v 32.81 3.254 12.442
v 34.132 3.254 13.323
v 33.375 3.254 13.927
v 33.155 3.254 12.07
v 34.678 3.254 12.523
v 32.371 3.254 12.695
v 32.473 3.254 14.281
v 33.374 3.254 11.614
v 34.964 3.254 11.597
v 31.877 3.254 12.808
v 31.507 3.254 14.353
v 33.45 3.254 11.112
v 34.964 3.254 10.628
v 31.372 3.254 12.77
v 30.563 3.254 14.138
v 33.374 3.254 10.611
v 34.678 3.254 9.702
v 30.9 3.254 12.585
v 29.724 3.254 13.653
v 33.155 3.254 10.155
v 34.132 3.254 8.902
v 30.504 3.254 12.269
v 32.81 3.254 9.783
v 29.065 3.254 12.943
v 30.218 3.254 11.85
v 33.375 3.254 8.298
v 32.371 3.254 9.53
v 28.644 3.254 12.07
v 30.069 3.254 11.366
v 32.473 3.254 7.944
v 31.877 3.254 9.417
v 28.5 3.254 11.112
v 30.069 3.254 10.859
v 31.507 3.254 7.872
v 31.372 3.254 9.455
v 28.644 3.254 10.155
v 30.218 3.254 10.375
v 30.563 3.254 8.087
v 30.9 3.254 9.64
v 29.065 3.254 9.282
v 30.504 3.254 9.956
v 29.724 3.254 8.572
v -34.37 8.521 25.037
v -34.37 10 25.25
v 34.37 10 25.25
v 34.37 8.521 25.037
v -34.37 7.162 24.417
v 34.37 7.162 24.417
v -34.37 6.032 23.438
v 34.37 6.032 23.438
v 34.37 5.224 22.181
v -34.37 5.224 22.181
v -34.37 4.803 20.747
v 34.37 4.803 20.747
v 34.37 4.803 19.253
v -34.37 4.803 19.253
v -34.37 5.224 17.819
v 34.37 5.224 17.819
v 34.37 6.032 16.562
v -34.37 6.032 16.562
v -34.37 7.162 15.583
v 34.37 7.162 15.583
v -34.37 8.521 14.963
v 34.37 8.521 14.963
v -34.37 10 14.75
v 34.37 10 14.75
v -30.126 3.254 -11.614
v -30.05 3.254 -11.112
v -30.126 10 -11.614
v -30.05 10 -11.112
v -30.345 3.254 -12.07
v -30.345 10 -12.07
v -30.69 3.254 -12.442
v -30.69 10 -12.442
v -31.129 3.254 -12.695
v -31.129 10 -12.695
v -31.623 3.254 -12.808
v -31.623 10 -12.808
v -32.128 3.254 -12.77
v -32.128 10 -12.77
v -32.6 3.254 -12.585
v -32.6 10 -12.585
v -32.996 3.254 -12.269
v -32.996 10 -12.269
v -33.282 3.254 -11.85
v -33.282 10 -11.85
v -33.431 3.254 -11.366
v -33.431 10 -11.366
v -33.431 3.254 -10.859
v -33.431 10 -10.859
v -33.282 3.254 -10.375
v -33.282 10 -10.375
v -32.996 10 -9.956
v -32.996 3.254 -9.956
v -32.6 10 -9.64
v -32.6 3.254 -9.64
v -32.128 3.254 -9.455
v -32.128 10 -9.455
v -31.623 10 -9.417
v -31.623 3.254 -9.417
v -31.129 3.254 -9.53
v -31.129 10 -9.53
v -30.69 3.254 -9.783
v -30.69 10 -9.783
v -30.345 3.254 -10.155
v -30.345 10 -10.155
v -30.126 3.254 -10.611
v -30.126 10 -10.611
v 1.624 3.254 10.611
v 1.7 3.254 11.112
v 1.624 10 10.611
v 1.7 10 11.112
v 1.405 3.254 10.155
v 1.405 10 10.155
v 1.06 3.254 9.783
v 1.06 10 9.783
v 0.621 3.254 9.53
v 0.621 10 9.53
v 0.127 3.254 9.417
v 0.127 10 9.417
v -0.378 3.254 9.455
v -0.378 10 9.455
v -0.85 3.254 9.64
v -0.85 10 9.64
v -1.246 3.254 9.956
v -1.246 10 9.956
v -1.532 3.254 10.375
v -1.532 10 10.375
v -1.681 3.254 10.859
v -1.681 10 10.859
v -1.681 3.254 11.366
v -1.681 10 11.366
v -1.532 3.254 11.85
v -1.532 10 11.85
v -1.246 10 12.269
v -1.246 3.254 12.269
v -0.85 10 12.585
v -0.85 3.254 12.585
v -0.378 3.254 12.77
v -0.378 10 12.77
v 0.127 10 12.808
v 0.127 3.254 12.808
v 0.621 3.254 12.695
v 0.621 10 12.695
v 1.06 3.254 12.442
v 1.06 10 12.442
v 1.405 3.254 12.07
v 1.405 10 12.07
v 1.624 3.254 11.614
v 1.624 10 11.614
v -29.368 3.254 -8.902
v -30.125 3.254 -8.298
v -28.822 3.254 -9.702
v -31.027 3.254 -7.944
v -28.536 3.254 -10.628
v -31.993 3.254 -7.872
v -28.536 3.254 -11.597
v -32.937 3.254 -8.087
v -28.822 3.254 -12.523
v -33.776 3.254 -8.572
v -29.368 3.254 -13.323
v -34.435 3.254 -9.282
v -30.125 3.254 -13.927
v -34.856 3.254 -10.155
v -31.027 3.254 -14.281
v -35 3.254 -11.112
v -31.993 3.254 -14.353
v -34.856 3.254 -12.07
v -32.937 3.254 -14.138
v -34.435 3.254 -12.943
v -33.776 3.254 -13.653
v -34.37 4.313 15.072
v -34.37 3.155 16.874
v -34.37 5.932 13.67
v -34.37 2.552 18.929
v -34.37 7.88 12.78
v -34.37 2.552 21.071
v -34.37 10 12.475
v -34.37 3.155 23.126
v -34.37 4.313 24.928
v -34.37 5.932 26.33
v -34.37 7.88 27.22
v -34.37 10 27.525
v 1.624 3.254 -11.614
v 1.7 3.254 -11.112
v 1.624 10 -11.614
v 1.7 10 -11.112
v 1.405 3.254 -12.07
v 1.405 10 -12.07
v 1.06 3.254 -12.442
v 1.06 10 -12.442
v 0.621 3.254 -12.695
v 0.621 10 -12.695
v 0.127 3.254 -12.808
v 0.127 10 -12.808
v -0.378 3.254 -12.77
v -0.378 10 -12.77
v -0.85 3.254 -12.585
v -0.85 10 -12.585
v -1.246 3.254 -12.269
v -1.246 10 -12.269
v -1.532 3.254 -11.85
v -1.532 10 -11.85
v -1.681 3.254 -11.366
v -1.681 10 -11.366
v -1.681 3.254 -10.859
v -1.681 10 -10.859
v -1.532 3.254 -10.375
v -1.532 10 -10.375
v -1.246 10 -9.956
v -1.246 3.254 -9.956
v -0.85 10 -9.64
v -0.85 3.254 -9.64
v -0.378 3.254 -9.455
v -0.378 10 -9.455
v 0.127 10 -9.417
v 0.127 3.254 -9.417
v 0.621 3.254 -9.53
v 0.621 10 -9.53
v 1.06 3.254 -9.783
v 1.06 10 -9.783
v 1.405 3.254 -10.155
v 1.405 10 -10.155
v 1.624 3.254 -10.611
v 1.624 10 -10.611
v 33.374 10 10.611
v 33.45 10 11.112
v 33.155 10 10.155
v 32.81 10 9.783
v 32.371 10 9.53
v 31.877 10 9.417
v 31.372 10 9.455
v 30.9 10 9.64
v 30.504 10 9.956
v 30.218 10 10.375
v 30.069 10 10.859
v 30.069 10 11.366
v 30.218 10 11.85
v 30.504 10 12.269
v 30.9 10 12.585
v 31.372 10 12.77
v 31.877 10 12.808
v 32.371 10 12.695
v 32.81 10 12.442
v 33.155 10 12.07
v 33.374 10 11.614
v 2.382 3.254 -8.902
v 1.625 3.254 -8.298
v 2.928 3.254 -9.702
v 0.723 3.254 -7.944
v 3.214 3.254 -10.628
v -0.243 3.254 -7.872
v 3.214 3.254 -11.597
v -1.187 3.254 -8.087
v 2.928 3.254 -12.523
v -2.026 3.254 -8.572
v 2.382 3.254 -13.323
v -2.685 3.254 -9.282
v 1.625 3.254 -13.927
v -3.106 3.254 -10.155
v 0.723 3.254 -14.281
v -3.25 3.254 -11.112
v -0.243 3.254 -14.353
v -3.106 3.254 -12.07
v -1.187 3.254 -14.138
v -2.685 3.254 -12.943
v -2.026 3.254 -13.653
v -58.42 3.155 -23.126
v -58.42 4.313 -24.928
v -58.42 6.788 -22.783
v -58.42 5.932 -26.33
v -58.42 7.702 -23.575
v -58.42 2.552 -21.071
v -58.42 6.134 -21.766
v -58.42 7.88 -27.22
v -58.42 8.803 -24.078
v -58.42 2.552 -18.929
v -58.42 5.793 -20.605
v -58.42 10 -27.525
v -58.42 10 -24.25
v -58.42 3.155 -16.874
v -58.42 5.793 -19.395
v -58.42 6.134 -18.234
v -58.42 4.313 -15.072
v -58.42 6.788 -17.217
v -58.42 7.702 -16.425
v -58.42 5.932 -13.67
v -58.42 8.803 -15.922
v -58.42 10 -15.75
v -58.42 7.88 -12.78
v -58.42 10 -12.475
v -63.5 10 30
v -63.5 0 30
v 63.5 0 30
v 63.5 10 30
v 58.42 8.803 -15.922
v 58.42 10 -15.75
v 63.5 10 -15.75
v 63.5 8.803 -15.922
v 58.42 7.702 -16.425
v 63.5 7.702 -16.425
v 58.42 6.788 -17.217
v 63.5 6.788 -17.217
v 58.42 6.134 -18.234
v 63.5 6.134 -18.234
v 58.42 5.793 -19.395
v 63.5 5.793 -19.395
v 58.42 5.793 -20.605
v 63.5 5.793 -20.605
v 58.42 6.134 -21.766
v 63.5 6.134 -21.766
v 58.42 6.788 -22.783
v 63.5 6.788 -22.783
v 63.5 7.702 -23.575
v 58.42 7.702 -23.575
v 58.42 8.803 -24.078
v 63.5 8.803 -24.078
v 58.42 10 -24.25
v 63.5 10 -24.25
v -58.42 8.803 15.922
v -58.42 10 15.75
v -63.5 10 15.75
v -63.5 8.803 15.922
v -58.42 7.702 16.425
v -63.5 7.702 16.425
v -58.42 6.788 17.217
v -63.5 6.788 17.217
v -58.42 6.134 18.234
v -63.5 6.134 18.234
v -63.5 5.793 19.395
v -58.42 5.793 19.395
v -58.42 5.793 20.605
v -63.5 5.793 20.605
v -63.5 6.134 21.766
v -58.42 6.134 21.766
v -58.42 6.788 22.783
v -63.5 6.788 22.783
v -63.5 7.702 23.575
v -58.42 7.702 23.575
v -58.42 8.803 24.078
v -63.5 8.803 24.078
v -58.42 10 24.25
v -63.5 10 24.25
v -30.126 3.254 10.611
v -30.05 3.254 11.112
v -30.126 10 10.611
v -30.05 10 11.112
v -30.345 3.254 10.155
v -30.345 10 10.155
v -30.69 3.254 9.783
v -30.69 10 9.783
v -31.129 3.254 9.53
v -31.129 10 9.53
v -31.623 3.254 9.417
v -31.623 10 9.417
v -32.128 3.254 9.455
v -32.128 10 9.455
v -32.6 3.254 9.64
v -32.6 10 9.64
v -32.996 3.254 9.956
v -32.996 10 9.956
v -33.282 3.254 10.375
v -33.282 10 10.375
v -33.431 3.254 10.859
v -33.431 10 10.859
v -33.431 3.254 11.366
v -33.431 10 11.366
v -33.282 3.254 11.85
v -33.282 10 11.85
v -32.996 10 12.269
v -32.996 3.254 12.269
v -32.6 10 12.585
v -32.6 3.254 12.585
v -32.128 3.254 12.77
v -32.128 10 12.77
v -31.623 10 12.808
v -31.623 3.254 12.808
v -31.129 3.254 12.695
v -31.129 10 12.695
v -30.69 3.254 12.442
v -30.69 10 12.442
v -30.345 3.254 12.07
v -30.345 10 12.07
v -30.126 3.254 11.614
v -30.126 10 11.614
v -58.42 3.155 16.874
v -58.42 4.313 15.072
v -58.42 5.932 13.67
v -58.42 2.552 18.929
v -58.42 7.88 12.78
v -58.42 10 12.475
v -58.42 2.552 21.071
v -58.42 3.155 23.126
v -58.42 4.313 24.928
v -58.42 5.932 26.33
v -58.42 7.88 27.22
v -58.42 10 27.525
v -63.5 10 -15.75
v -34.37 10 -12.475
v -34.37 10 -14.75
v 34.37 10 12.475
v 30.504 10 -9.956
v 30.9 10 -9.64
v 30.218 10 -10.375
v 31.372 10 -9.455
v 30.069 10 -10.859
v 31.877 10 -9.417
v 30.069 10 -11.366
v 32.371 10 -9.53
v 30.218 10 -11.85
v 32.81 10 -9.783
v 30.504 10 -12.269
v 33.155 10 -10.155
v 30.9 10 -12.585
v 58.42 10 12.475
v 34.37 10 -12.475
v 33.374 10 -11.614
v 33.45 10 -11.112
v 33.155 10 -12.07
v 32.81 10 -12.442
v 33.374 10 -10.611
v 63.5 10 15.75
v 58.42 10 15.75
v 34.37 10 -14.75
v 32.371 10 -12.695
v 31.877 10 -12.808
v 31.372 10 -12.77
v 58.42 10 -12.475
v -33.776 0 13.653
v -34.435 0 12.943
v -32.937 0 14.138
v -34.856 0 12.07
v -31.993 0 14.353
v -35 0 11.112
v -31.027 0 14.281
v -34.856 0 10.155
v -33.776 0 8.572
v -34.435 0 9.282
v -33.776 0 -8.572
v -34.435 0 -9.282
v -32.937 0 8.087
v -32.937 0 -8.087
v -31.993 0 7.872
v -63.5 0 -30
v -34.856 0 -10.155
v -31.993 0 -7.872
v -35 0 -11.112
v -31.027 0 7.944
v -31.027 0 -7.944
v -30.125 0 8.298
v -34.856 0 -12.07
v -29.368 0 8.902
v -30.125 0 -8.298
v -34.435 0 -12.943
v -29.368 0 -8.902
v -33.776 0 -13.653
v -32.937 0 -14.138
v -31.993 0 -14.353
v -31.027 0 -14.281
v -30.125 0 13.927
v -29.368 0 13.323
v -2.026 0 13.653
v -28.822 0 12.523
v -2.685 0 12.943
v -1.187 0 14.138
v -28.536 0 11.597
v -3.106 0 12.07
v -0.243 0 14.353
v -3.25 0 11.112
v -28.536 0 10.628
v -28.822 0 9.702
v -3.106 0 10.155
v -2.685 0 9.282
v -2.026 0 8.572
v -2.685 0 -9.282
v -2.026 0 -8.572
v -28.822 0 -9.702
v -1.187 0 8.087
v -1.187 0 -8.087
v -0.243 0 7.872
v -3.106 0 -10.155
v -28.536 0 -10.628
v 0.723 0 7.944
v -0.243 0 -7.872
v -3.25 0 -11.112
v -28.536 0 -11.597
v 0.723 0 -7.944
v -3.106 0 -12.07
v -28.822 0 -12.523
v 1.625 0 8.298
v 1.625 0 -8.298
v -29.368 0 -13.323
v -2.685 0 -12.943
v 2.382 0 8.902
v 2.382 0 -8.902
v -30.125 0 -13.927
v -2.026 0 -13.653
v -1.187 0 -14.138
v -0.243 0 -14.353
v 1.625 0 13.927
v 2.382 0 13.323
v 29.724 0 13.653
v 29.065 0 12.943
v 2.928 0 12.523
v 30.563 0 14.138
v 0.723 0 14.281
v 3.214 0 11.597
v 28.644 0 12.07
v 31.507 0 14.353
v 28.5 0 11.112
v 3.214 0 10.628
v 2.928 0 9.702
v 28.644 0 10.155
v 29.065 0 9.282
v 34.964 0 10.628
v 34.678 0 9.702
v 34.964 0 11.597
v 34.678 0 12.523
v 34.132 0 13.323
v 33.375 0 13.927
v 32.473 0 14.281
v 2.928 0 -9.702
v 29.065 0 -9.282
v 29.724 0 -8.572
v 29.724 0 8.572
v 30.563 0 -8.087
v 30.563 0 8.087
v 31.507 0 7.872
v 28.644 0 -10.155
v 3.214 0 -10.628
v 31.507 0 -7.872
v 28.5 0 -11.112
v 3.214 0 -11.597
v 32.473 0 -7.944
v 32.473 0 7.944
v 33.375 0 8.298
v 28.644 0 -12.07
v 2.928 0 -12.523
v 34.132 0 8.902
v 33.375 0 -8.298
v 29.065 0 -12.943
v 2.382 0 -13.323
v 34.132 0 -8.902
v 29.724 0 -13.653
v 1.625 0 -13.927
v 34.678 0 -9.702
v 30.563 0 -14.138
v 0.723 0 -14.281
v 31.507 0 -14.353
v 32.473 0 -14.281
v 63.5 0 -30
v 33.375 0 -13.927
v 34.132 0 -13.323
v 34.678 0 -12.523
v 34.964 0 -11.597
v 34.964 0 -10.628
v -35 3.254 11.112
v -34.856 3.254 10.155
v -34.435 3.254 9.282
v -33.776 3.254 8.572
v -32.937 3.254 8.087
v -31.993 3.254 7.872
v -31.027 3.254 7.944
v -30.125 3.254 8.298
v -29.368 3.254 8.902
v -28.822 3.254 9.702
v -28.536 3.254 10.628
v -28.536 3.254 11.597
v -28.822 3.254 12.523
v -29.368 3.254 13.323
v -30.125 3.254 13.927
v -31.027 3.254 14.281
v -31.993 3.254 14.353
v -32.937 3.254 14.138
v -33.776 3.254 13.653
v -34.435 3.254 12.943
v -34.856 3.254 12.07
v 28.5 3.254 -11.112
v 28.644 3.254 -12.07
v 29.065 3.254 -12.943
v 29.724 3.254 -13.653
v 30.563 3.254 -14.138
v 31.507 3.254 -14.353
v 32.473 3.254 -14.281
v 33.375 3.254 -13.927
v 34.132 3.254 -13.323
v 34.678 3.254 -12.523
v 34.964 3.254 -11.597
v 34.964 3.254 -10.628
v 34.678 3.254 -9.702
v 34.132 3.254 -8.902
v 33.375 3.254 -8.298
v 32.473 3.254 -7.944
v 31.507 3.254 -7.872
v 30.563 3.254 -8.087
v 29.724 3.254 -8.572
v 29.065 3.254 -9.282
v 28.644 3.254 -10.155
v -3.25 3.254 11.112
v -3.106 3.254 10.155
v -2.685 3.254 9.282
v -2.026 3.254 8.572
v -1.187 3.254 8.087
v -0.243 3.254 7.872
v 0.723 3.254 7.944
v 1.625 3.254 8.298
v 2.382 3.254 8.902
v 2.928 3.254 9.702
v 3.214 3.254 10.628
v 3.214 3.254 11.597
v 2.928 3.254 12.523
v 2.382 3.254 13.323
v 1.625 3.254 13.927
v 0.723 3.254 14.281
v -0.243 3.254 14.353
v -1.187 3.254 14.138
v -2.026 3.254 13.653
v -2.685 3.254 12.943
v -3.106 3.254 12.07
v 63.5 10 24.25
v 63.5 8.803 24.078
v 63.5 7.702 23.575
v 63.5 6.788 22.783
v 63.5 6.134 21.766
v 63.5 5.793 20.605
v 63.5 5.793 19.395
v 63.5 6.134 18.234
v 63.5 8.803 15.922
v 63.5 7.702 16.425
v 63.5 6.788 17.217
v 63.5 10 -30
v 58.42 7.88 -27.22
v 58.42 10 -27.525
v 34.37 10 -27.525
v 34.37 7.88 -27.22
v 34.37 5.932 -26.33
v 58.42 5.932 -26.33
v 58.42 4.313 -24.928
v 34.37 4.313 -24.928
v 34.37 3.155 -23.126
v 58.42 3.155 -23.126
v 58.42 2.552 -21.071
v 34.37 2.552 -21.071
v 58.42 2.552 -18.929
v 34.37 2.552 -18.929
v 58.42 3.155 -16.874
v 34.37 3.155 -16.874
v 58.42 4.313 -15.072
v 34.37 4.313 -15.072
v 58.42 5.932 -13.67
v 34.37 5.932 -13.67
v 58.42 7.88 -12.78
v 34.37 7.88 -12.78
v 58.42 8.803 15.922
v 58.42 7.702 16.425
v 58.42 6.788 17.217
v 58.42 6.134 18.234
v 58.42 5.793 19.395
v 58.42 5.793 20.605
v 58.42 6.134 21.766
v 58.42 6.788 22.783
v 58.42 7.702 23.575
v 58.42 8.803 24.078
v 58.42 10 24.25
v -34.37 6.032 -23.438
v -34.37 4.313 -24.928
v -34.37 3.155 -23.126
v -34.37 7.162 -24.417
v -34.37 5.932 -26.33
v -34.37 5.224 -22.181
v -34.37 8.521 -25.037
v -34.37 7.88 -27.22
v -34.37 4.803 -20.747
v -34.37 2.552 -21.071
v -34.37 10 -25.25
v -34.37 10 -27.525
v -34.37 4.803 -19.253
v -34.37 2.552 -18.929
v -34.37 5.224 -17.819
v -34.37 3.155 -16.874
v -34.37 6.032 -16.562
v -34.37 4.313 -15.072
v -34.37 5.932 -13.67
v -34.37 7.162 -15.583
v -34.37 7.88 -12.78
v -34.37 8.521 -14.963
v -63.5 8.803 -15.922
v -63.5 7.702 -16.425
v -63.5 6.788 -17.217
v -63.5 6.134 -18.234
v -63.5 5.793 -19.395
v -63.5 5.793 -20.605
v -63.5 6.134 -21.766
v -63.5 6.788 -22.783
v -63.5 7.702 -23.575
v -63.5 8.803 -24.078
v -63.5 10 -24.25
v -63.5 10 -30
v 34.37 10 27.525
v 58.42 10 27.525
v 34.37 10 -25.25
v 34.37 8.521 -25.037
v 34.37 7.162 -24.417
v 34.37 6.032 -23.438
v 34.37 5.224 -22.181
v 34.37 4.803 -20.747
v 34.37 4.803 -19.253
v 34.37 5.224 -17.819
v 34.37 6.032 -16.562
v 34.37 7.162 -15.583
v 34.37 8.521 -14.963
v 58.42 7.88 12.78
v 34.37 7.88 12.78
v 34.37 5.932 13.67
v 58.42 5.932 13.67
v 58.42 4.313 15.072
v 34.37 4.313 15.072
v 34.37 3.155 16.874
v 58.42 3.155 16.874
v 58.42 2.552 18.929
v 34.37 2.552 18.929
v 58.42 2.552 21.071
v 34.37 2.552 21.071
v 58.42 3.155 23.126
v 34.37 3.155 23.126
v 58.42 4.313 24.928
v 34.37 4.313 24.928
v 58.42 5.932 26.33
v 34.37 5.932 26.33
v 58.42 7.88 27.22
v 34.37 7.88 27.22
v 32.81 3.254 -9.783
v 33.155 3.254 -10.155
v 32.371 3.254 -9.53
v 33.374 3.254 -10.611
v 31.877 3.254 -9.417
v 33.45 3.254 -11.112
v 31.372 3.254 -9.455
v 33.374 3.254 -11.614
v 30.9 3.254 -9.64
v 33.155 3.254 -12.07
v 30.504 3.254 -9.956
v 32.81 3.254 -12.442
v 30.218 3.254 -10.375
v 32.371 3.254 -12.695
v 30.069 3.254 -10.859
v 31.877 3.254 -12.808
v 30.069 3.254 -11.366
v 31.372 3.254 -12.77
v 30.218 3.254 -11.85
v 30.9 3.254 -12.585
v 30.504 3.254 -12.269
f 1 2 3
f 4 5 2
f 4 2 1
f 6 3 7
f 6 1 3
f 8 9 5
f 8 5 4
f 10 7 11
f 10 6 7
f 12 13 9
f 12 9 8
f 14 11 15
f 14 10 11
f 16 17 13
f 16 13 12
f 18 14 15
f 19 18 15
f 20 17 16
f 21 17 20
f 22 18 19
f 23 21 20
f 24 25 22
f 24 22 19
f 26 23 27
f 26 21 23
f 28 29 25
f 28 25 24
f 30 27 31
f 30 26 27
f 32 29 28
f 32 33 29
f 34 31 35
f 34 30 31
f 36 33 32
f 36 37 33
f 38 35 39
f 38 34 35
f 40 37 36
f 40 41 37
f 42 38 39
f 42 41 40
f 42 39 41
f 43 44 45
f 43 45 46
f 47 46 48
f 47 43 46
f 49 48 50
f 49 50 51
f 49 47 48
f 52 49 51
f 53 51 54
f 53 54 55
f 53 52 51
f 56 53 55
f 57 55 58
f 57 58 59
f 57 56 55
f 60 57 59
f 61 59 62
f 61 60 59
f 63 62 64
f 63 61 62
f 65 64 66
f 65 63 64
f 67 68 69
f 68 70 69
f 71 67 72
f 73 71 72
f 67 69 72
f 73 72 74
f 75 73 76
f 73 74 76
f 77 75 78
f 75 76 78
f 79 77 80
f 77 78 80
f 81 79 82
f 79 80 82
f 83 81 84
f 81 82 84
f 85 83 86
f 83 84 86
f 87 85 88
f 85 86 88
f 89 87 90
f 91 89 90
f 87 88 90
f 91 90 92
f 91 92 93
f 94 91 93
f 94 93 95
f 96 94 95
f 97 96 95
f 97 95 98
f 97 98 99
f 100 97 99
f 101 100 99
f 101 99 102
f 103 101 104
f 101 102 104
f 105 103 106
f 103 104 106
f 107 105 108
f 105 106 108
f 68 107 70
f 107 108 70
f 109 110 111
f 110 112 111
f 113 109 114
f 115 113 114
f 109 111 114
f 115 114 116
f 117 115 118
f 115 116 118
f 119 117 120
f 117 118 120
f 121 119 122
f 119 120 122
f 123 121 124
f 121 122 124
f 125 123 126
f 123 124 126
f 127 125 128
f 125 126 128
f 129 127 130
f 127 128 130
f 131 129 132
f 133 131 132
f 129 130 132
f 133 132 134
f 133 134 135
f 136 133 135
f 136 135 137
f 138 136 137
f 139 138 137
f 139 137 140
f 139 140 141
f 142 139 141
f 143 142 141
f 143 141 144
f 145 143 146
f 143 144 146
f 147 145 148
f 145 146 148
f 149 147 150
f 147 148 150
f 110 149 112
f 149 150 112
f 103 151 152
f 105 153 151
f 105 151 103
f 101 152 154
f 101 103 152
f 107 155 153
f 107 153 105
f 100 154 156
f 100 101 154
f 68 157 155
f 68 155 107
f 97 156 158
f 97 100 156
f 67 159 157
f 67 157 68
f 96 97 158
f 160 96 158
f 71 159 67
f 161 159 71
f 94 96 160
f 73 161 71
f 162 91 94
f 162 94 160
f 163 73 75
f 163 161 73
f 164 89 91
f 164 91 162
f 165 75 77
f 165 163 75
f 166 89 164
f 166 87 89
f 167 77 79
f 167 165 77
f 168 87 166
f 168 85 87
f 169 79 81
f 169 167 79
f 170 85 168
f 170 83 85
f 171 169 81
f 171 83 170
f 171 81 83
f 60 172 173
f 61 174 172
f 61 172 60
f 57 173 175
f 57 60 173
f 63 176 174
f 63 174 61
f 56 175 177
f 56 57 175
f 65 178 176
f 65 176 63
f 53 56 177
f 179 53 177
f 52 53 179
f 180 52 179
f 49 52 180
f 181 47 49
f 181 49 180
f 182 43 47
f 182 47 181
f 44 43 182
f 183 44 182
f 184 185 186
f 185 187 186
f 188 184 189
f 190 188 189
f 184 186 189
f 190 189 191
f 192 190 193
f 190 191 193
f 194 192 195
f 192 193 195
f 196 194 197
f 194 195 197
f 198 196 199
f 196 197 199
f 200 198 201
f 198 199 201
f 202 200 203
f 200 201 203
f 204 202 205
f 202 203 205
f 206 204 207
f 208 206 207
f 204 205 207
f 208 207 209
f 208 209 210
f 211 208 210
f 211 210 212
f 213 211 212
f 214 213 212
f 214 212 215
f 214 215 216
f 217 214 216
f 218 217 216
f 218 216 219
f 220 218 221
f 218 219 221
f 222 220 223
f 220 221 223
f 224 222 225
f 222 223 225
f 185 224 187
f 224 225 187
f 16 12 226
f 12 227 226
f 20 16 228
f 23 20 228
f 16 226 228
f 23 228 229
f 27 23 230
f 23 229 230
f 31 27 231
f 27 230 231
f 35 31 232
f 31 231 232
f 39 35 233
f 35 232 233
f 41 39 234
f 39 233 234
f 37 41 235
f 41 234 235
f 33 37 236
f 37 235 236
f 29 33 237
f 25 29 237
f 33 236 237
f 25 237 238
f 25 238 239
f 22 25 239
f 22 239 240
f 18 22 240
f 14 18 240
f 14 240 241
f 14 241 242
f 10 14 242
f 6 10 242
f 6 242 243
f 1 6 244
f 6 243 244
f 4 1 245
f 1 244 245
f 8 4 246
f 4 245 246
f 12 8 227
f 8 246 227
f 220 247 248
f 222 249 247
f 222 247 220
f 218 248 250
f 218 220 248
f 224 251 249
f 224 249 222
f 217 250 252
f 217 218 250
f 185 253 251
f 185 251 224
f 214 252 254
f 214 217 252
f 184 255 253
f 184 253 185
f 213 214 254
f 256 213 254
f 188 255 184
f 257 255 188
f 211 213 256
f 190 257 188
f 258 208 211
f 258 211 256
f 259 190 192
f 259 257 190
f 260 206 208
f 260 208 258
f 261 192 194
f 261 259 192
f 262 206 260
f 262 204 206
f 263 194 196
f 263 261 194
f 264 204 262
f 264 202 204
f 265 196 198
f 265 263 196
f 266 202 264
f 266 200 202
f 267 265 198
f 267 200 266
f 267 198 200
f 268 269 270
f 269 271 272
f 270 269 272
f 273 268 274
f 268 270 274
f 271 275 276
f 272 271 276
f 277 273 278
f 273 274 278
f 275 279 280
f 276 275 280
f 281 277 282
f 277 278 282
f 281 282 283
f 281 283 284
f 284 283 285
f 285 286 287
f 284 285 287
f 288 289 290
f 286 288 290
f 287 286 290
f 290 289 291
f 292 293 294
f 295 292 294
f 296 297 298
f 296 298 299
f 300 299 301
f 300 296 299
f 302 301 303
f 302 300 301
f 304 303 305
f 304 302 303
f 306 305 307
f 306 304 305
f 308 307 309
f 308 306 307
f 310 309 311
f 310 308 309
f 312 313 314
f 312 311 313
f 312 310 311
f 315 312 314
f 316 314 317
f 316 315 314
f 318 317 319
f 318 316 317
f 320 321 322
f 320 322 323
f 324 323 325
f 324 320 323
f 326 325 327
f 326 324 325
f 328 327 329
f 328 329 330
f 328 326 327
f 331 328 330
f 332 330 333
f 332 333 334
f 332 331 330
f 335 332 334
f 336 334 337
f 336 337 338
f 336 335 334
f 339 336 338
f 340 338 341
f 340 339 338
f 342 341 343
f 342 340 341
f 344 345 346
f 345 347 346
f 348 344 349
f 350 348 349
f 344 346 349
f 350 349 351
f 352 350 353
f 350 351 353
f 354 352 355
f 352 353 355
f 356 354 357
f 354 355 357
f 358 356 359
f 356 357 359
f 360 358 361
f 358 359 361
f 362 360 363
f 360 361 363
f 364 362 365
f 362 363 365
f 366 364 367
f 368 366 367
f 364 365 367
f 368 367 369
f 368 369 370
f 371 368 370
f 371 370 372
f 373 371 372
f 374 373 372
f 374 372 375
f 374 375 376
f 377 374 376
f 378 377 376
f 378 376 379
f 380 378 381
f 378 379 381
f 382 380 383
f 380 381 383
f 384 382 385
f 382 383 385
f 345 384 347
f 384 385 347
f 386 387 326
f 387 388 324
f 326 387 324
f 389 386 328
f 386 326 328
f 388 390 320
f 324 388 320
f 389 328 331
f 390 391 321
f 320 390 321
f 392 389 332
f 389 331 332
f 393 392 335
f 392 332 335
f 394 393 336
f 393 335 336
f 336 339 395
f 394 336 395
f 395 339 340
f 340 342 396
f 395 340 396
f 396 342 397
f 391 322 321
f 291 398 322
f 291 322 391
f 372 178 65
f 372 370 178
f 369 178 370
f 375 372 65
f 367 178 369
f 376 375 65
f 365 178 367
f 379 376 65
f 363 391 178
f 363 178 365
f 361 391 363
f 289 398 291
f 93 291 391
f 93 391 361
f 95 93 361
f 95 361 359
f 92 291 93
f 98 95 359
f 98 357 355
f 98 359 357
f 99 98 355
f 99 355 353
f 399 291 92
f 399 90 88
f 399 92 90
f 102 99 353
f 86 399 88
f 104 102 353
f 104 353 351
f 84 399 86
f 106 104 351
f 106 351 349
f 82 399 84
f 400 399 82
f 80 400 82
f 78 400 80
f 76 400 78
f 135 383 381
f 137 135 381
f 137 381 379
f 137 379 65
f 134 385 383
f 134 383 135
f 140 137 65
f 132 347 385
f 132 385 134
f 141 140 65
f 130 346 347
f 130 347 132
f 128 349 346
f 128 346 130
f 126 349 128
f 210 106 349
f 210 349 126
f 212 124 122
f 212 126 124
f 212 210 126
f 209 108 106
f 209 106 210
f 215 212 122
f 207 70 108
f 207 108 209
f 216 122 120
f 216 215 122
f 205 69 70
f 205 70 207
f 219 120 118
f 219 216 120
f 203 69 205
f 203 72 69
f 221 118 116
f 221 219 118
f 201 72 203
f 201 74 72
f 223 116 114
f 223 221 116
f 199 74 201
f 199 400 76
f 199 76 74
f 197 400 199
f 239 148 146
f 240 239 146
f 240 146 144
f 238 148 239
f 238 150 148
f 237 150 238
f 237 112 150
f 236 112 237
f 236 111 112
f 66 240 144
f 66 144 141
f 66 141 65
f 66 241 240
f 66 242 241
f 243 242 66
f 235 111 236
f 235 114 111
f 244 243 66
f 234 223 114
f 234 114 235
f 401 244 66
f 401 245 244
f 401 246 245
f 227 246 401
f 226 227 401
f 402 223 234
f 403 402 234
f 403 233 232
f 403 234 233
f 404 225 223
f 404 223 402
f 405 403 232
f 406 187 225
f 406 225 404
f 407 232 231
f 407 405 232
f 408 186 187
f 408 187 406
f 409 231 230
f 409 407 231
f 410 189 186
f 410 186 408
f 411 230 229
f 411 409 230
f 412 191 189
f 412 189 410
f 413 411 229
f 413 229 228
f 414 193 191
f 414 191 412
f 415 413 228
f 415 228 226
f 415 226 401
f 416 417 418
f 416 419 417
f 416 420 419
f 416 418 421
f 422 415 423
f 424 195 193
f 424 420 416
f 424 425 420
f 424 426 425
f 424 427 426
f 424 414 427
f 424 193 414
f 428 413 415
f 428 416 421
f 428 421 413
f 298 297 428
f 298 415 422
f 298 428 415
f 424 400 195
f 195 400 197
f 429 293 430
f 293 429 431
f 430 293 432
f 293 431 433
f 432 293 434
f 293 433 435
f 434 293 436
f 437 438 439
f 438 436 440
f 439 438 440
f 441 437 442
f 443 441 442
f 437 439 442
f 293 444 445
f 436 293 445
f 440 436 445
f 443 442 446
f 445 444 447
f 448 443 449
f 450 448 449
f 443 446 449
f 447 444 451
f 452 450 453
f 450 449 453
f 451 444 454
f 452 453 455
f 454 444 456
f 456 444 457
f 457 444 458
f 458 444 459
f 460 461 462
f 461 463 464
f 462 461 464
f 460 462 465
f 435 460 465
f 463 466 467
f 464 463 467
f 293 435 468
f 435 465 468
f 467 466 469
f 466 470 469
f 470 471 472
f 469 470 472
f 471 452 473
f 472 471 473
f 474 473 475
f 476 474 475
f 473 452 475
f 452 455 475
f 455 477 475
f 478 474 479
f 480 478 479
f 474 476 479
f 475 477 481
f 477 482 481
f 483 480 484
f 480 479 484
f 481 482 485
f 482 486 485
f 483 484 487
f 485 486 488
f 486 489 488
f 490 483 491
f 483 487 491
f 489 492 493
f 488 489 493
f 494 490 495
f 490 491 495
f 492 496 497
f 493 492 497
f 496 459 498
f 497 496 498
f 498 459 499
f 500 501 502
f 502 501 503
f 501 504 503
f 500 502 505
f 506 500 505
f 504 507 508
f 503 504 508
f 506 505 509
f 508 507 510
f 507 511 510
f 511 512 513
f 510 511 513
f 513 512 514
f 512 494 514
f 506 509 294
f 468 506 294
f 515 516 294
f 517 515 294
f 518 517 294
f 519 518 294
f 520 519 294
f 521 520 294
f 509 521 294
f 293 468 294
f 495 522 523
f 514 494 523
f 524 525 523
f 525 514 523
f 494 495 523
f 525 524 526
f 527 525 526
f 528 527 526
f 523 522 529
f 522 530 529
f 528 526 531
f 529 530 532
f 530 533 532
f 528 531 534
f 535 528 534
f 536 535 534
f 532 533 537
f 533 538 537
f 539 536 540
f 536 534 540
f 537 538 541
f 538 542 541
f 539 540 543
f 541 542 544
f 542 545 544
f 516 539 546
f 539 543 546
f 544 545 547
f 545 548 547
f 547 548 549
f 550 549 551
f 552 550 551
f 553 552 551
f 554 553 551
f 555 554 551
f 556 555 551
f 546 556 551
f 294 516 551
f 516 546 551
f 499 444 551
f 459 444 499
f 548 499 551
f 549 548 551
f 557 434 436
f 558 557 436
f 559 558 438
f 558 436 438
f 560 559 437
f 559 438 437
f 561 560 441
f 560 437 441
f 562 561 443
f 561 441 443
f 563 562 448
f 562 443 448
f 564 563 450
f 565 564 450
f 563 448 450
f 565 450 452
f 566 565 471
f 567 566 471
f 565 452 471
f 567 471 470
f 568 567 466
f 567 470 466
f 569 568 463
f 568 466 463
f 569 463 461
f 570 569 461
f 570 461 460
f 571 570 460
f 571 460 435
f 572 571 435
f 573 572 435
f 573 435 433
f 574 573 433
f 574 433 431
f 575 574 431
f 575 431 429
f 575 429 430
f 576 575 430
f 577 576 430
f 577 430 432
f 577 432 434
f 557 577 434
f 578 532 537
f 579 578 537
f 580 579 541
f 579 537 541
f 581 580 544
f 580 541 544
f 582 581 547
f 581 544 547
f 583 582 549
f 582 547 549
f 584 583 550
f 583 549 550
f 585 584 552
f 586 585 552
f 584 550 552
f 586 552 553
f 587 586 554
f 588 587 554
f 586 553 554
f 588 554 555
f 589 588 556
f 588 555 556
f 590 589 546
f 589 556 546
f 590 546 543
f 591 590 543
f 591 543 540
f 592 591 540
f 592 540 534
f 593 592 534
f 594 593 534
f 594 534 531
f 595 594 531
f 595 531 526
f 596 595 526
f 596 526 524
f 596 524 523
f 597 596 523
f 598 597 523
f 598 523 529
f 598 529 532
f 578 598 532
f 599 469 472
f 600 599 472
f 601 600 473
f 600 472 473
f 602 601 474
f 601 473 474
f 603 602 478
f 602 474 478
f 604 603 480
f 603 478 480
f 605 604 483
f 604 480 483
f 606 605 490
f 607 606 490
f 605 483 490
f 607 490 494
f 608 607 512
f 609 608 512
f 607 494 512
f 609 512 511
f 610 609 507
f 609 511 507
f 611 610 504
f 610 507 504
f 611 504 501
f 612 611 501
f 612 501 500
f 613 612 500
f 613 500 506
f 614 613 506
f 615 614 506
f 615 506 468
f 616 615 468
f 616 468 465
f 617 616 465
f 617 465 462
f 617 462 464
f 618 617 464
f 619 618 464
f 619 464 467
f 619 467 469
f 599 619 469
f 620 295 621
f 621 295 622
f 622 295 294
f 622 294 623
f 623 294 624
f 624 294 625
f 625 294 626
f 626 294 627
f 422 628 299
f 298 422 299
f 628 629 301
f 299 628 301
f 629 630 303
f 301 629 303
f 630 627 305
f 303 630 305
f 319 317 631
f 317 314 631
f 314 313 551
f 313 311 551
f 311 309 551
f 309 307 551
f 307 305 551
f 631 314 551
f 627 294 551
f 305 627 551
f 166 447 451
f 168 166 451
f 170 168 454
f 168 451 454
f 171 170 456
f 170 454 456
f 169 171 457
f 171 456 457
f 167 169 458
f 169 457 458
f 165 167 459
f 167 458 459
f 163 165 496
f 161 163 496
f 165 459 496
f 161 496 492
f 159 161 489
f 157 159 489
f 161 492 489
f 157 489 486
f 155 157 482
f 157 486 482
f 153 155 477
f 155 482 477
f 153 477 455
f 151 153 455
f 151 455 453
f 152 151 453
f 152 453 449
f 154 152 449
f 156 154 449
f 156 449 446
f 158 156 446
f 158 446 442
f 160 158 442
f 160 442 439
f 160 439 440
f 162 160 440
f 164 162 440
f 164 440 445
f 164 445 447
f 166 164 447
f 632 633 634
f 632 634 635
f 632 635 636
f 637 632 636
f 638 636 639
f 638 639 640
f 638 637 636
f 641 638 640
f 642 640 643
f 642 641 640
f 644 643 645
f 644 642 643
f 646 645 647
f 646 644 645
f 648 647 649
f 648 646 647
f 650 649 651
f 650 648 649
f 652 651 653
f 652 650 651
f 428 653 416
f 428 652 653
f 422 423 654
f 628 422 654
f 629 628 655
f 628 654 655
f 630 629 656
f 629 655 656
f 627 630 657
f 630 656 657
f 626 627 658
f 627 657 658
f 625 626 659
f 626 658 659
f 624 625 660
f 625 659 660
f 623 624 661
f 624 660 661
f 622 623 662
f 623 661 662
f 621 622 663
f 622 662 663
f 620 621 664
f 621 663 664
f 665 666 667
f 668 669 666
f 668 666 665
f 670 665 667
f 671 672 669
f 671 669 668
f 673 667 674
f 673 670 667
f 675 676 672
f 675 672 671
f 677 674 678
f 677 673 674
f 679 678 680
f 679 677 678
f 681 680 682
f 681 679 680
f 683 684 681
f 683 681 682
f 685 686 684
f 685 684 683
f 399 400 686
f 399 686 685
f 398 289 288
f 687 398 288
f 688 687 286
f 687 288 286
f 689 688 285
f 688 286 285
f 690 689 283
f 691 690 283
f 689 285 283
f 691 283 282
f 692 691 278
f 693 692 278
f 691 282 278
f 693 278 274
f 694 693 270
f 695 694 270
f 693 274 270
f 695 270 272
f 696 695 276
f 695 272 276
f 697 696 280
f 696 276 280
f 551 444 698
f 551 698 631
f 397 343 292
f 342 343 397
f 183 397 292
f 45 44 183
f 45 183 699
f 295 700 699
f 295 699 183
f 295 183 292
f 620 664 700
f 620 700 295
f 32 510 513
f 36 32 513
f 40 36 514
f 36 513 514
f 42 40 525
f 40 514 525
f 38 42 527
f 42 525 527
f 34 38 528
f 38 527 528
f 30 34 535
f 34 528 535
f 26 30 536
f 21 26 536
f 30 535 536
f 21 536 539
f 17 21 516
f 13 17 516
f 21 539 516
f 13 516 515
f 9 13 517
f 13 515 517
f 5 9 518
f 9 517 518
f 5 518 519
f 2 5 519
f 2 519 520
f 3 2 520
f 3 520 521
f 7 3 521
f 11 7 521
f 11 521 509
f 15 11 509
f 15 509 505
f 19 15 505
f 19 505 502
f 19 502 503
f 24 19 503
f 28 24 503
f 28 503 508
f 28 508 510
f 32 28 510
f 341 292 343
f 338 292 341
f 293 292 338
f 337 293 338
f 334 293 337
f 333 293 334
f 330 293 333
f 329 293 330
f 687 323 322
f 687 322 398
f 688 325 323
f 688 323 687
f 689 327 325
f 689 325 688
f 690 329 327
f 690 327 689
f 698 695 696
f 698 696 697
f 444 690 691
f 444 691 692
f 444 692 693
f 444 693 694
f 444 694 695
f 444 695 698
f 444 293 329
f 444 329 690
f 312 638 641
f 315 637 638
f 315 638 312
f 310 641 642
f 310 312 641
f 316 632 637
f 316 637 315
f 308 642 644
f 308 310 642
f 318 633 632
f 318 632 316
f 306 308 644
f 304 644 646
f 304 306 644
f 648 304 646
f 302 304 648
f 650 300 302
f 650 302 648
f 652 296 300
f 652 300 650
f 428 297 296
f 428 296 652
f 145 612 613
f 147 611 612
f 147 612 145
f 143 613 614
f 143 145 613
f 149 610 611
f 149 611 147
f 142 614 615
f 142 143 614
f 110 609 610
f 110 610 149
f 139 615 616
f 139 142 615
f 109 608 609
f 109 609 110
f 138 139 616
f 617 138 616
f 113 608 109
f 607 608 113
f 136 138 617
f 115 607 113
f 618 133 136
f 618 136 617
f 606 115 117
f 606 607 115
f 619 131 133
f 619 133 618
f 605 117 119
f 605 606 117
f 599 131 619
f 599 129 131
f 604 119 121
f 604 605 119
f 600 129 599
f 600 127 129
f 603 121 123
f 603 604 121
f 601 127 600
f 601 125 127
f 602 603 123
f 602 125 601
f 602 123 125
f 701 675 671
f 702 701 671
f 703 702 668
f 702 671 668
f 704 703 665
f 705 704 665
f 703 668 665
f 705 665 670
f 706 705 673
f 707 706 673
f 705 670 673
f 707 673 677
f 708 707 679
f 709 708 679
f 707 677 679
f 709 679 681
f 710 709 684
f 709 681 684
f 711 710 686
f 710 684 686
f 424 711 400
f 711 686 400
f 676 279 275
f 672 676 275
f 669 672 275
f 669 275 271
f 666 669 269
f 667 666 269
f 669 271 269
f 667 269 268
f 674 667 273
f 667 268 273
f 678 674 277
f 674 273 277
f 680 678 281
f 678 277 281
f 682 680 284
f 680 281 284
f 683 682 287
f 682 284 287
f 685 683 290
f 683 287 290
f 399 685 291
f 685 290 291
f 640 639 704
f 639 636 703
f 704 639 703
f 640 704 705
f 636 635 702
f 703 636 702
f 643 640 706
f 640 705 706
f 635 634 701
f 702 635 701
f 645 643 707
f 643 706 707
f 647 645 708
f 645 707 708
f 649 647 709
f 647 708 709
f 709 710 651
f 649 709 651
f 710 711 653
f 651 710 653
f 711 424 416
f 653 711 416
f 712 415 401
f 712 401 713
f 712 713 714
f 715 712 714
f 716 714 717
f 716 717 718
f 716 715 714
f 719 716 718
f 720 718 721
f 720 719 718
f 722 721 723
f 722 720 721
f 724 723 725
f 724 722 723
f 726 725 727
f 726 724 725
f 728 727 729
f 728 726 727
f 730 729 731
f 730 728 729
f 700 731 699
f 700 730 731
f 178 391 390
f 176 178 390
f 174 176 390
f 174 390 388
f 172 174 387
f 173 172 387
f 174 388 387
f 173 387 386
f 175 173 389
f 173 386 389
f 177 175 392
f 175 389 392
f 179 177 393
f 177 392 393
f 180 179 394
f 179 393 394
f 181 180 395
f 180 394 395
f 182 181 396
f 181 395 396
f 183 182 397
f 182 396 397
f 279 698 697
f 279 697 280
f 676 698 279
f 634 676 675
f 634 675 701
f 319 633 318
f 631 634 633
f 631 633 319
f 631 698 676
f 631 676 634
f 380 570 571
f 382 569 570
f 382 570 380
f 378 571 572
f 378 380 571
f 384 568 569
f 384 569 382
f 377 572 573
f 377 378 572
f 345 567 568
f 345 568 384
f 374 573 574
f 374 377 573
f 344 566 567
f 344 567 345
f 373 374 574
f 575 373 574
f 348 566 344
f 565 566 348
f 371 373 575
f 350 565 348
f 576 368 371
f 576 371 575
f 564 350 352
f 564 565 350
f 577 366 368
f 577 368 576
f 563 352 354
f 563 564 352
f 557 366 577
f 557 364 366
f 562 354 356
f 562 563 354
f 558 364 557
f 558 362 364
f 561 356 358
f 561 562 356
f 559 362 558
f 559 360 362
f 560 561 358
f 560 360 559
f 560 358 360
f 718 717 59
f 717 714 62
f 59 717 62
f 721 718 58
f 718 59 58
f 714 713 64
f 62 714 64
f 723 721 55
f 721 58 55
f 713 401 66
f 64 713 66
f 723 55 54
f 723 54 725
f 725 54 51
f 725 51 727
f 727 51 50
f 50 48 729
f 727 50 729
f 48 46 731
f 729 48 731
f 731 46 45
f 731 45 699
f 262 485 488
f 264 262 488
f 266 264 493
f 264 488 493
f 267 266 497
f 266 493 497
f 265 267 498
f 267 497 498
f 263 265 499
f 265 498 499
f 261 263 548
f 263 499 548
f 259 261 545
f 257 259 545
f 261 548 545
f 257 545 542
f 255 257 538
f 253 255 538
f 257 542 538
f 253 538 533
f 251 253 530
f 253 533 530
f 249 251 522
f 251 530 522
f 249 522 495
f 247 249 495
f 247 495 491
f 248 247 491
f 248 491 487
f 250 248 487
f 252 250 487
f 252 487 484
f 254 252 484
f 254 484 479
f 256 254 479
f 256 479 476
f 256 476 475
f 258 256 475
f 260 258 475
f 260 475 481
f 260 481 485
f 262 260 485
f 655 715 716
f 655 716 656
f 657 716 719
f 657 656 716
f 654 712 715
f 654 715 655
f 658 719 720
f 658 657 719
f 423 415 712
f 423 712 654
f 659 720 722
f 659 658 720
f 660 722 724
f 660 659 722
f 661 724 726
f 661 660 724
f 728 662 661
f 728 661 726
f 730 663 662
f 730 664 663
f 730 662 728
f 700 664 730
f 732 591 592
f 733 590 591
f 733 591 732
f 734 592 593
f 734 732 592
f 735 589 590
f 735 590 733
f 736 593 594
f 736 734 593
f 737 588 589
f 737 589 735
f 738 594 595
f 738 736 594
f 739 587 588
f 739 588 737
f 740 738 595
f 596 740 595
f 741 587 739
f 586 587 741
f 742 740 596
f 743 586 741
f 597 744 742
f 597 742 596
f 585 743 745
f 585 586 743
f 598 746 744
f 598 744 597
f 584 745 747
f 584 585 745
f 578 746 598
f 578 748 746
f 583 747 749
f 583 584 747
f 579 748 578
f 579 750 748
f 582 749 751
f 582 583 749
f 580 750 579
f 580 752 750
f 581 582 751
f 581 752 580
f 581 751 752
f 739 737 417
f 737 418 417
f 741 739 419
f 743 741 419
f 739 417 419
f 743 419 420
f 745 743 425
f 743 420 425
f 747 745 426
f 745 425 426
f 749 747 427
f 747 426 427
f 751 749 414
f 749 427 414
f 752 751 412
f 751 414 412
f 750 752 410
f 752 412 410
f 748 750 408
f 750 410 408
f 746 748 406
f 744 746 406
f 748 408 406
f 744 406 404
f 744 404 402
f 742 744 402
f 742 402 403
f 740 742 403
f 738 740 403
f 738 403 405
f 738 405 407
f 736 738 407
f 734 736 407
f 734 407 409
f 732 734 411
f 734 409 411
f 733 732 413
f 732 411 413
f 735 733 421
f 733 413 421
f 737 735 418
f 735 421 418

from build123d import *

# Parameters (mm, degrees)
SKETCH1_W                      = 127
SKETCH1_H                      = 60
BOSS_EXTRUDE1_DEPTH            = 10
CUT_EXTRUDE1_START             = -5.08
SKETCH3_R                      = 7.525
CUT_EXTRUDE1_DEPTH             = 24.05
CUT_EXTRUDE2_REACH             = 127.954
SKETCH4_R                      = 4.25
CUT_EXTRUDE2_DIRECTION_2_REACH = 127.954
CUT_EXTRUDE3_START             = -68.74
SKETCH5_R                      = 5.25
SKETCH5_R_2                    = 4.25
CUT_EXTRUDE3_DEPTH             = 68.74
CBORE_FOR_M3_SHCS1_D           = 3.4
CBORE_FOR_M3_SHCS1_CBORE_D     = 6.5
CBORE_FOR_M3_SHCS1_CBORE_DEPTH = 3.254


with BuildPart() as part:
    # Sketch1 → Boss-Extrude1 (new body)
    with BuildSketch(Plane(origin=(0, 0, 0), x_dir=(1, 0, 0), z_dir=(0, 1, 0))):
        Rectangle(SKETCH1_W, SKETCH1_H)
    extrude(amount=BOSS_EXTRUDE1_DEPTH)

    # Sketch3 → Cut-Extrude1 (cut)
    with BuildSketch(Plane.ZY.offset(63.5).offset(CUT_EXTRUDE1_START)):
        with Locations((-20, 10)):
            Circle(SKETCH3_R)
        with Locations((20, 10)):
            Circle(SKETCH3_R)
    cut_extrude1 = extrude(amount=-CUT_EXTRUDE1_DEPTH, mode=Mode.SUBTRACT)

    # Mirror1: Cut-Extrude1 across plane
    add(cut_extrude1.mirror(Plane(origin=(0, 0, 0), x_dir=(0, 0, 1), z_dir=(1, 0, 0))), mode=Mode.SUBTRACT)

    # Sketch4 → Cut-Extrude2 (cut, up to next)
    with BuildSketch(Plane(origin=(-58.42, 0, 0), x_dir=(0, 0, -1), z_dir=(1, 0, 0)), mode=Mode.PRIVATE) as cut_extrude2_sk1:
        with Locations((20, 10)):
            Circle(SKETCH4_R)
    cut_extrude2_tool1 = extrude(cut_extrude2_sk1.sketch, amount=-CUT_EXTRUDE2_REACH, mode=Mode.PRIVATE) & part.part
    cut_extrude2 = cut_extrude2_tool1.solids().sort_by_distance((-58.42, 10, -20))[0]
    add(cut_extrude2, mode=Mode.SUBTRACT)

    # Cut-Extrude2 direction 2: up to this face of the body (flat: up to its plane)
    cut_extrude2_direction_2_end = Plane(part.part.faces().sort_by_distance((63.5, 5, 0))[0])
    # Sketch4 → Cut-Extrude2 direction 2 (cut, up to the picked face)
    with BuildSketch(Plane(origin=(-58.42, 0, 0), x_dir=(0, 0, -1), z_dir=(1, 0, 0)), mode=Mode.PRIVATE) as cut_extrude2_direction_2_sk1:
        with Locations((20, 10)):
            Circle(SKETCH4_R)
    cut_extrude2_direction_2_tool1 = split(extrude(cut_extrude2_direction_2_sk1.sketch, amount=CUT_EXTRUDE2_DIRECTION_2_REACH, mode=Mode.PRIVATE), bisect_by=cut_extrude2_direction_2_end, keep=Keep.BOTH, mode=Mode.PRIVATE)
    cut_extrude2_direction_2 = cut_extrude2_direction_2_tool1.solids().sort_by(Axis((-58.42, 10, -20), (1, 0, 0)))[0]
    add(cut_extrude2_direction_2, mode=Mode.SUBTRACT)

    # Mirror2: Cut-Extrude2, Cut-Extrude2 direction 2 across plane
    add(cut_extrude2.mirror(Plane.XY), mode=Mode.SUBTRACT)
    add(cut_extrude2_direction_2.mirror(Plane.XY), mode=Mode.SUBTRACT)

    # Sketch5 → Cut-Extrude3 (cut)
    with BuildSketch(Plane(origin=(34.37, 0, 0), x_dir=(0, 0, -1), z_dir=(1, 0, 0)).offset(CUT_EXTRUDE3_START)):
        with Locations((-20, 10)):
            Circle(SKETCH5_R)
        with Locations((-20, 10)):
            Circle(SKETCH5_R_2, mode=Mode.SUBTRACT)
    cut_extrude3 = extrude(amount=CUT_EXTRUDE3_DEPTH, mode=Mode.SUBTRACT)

    # Mirror3: Cut-Extrude3 across plane
    add(cut_extrude3.mirror(Plane.XY), mode=Mode.SUBTRACT)

    # CBORE for M3 SHCS1 (through all)
    with Locations(Plane(origin=(0, 0, 0), x_dir=(-1, 0, 0), z_dir=(0, -1, 0))):
        with Locations((-31.75, -11.1125), (0, -11.1125), (31.75, -11.1125), (-31.75, 11.1125), (0, 11.1125), (31.75, 11.1125)):
            CounterBoreHole(CBORE_FOR_M3_SHCS1_D / 2, CBORE_FOR_M3_SHCS1_CBORE_D / 2, CBORE_FOR_M3_SHCS1_CBORE_DEPTH)


solid = part.part
